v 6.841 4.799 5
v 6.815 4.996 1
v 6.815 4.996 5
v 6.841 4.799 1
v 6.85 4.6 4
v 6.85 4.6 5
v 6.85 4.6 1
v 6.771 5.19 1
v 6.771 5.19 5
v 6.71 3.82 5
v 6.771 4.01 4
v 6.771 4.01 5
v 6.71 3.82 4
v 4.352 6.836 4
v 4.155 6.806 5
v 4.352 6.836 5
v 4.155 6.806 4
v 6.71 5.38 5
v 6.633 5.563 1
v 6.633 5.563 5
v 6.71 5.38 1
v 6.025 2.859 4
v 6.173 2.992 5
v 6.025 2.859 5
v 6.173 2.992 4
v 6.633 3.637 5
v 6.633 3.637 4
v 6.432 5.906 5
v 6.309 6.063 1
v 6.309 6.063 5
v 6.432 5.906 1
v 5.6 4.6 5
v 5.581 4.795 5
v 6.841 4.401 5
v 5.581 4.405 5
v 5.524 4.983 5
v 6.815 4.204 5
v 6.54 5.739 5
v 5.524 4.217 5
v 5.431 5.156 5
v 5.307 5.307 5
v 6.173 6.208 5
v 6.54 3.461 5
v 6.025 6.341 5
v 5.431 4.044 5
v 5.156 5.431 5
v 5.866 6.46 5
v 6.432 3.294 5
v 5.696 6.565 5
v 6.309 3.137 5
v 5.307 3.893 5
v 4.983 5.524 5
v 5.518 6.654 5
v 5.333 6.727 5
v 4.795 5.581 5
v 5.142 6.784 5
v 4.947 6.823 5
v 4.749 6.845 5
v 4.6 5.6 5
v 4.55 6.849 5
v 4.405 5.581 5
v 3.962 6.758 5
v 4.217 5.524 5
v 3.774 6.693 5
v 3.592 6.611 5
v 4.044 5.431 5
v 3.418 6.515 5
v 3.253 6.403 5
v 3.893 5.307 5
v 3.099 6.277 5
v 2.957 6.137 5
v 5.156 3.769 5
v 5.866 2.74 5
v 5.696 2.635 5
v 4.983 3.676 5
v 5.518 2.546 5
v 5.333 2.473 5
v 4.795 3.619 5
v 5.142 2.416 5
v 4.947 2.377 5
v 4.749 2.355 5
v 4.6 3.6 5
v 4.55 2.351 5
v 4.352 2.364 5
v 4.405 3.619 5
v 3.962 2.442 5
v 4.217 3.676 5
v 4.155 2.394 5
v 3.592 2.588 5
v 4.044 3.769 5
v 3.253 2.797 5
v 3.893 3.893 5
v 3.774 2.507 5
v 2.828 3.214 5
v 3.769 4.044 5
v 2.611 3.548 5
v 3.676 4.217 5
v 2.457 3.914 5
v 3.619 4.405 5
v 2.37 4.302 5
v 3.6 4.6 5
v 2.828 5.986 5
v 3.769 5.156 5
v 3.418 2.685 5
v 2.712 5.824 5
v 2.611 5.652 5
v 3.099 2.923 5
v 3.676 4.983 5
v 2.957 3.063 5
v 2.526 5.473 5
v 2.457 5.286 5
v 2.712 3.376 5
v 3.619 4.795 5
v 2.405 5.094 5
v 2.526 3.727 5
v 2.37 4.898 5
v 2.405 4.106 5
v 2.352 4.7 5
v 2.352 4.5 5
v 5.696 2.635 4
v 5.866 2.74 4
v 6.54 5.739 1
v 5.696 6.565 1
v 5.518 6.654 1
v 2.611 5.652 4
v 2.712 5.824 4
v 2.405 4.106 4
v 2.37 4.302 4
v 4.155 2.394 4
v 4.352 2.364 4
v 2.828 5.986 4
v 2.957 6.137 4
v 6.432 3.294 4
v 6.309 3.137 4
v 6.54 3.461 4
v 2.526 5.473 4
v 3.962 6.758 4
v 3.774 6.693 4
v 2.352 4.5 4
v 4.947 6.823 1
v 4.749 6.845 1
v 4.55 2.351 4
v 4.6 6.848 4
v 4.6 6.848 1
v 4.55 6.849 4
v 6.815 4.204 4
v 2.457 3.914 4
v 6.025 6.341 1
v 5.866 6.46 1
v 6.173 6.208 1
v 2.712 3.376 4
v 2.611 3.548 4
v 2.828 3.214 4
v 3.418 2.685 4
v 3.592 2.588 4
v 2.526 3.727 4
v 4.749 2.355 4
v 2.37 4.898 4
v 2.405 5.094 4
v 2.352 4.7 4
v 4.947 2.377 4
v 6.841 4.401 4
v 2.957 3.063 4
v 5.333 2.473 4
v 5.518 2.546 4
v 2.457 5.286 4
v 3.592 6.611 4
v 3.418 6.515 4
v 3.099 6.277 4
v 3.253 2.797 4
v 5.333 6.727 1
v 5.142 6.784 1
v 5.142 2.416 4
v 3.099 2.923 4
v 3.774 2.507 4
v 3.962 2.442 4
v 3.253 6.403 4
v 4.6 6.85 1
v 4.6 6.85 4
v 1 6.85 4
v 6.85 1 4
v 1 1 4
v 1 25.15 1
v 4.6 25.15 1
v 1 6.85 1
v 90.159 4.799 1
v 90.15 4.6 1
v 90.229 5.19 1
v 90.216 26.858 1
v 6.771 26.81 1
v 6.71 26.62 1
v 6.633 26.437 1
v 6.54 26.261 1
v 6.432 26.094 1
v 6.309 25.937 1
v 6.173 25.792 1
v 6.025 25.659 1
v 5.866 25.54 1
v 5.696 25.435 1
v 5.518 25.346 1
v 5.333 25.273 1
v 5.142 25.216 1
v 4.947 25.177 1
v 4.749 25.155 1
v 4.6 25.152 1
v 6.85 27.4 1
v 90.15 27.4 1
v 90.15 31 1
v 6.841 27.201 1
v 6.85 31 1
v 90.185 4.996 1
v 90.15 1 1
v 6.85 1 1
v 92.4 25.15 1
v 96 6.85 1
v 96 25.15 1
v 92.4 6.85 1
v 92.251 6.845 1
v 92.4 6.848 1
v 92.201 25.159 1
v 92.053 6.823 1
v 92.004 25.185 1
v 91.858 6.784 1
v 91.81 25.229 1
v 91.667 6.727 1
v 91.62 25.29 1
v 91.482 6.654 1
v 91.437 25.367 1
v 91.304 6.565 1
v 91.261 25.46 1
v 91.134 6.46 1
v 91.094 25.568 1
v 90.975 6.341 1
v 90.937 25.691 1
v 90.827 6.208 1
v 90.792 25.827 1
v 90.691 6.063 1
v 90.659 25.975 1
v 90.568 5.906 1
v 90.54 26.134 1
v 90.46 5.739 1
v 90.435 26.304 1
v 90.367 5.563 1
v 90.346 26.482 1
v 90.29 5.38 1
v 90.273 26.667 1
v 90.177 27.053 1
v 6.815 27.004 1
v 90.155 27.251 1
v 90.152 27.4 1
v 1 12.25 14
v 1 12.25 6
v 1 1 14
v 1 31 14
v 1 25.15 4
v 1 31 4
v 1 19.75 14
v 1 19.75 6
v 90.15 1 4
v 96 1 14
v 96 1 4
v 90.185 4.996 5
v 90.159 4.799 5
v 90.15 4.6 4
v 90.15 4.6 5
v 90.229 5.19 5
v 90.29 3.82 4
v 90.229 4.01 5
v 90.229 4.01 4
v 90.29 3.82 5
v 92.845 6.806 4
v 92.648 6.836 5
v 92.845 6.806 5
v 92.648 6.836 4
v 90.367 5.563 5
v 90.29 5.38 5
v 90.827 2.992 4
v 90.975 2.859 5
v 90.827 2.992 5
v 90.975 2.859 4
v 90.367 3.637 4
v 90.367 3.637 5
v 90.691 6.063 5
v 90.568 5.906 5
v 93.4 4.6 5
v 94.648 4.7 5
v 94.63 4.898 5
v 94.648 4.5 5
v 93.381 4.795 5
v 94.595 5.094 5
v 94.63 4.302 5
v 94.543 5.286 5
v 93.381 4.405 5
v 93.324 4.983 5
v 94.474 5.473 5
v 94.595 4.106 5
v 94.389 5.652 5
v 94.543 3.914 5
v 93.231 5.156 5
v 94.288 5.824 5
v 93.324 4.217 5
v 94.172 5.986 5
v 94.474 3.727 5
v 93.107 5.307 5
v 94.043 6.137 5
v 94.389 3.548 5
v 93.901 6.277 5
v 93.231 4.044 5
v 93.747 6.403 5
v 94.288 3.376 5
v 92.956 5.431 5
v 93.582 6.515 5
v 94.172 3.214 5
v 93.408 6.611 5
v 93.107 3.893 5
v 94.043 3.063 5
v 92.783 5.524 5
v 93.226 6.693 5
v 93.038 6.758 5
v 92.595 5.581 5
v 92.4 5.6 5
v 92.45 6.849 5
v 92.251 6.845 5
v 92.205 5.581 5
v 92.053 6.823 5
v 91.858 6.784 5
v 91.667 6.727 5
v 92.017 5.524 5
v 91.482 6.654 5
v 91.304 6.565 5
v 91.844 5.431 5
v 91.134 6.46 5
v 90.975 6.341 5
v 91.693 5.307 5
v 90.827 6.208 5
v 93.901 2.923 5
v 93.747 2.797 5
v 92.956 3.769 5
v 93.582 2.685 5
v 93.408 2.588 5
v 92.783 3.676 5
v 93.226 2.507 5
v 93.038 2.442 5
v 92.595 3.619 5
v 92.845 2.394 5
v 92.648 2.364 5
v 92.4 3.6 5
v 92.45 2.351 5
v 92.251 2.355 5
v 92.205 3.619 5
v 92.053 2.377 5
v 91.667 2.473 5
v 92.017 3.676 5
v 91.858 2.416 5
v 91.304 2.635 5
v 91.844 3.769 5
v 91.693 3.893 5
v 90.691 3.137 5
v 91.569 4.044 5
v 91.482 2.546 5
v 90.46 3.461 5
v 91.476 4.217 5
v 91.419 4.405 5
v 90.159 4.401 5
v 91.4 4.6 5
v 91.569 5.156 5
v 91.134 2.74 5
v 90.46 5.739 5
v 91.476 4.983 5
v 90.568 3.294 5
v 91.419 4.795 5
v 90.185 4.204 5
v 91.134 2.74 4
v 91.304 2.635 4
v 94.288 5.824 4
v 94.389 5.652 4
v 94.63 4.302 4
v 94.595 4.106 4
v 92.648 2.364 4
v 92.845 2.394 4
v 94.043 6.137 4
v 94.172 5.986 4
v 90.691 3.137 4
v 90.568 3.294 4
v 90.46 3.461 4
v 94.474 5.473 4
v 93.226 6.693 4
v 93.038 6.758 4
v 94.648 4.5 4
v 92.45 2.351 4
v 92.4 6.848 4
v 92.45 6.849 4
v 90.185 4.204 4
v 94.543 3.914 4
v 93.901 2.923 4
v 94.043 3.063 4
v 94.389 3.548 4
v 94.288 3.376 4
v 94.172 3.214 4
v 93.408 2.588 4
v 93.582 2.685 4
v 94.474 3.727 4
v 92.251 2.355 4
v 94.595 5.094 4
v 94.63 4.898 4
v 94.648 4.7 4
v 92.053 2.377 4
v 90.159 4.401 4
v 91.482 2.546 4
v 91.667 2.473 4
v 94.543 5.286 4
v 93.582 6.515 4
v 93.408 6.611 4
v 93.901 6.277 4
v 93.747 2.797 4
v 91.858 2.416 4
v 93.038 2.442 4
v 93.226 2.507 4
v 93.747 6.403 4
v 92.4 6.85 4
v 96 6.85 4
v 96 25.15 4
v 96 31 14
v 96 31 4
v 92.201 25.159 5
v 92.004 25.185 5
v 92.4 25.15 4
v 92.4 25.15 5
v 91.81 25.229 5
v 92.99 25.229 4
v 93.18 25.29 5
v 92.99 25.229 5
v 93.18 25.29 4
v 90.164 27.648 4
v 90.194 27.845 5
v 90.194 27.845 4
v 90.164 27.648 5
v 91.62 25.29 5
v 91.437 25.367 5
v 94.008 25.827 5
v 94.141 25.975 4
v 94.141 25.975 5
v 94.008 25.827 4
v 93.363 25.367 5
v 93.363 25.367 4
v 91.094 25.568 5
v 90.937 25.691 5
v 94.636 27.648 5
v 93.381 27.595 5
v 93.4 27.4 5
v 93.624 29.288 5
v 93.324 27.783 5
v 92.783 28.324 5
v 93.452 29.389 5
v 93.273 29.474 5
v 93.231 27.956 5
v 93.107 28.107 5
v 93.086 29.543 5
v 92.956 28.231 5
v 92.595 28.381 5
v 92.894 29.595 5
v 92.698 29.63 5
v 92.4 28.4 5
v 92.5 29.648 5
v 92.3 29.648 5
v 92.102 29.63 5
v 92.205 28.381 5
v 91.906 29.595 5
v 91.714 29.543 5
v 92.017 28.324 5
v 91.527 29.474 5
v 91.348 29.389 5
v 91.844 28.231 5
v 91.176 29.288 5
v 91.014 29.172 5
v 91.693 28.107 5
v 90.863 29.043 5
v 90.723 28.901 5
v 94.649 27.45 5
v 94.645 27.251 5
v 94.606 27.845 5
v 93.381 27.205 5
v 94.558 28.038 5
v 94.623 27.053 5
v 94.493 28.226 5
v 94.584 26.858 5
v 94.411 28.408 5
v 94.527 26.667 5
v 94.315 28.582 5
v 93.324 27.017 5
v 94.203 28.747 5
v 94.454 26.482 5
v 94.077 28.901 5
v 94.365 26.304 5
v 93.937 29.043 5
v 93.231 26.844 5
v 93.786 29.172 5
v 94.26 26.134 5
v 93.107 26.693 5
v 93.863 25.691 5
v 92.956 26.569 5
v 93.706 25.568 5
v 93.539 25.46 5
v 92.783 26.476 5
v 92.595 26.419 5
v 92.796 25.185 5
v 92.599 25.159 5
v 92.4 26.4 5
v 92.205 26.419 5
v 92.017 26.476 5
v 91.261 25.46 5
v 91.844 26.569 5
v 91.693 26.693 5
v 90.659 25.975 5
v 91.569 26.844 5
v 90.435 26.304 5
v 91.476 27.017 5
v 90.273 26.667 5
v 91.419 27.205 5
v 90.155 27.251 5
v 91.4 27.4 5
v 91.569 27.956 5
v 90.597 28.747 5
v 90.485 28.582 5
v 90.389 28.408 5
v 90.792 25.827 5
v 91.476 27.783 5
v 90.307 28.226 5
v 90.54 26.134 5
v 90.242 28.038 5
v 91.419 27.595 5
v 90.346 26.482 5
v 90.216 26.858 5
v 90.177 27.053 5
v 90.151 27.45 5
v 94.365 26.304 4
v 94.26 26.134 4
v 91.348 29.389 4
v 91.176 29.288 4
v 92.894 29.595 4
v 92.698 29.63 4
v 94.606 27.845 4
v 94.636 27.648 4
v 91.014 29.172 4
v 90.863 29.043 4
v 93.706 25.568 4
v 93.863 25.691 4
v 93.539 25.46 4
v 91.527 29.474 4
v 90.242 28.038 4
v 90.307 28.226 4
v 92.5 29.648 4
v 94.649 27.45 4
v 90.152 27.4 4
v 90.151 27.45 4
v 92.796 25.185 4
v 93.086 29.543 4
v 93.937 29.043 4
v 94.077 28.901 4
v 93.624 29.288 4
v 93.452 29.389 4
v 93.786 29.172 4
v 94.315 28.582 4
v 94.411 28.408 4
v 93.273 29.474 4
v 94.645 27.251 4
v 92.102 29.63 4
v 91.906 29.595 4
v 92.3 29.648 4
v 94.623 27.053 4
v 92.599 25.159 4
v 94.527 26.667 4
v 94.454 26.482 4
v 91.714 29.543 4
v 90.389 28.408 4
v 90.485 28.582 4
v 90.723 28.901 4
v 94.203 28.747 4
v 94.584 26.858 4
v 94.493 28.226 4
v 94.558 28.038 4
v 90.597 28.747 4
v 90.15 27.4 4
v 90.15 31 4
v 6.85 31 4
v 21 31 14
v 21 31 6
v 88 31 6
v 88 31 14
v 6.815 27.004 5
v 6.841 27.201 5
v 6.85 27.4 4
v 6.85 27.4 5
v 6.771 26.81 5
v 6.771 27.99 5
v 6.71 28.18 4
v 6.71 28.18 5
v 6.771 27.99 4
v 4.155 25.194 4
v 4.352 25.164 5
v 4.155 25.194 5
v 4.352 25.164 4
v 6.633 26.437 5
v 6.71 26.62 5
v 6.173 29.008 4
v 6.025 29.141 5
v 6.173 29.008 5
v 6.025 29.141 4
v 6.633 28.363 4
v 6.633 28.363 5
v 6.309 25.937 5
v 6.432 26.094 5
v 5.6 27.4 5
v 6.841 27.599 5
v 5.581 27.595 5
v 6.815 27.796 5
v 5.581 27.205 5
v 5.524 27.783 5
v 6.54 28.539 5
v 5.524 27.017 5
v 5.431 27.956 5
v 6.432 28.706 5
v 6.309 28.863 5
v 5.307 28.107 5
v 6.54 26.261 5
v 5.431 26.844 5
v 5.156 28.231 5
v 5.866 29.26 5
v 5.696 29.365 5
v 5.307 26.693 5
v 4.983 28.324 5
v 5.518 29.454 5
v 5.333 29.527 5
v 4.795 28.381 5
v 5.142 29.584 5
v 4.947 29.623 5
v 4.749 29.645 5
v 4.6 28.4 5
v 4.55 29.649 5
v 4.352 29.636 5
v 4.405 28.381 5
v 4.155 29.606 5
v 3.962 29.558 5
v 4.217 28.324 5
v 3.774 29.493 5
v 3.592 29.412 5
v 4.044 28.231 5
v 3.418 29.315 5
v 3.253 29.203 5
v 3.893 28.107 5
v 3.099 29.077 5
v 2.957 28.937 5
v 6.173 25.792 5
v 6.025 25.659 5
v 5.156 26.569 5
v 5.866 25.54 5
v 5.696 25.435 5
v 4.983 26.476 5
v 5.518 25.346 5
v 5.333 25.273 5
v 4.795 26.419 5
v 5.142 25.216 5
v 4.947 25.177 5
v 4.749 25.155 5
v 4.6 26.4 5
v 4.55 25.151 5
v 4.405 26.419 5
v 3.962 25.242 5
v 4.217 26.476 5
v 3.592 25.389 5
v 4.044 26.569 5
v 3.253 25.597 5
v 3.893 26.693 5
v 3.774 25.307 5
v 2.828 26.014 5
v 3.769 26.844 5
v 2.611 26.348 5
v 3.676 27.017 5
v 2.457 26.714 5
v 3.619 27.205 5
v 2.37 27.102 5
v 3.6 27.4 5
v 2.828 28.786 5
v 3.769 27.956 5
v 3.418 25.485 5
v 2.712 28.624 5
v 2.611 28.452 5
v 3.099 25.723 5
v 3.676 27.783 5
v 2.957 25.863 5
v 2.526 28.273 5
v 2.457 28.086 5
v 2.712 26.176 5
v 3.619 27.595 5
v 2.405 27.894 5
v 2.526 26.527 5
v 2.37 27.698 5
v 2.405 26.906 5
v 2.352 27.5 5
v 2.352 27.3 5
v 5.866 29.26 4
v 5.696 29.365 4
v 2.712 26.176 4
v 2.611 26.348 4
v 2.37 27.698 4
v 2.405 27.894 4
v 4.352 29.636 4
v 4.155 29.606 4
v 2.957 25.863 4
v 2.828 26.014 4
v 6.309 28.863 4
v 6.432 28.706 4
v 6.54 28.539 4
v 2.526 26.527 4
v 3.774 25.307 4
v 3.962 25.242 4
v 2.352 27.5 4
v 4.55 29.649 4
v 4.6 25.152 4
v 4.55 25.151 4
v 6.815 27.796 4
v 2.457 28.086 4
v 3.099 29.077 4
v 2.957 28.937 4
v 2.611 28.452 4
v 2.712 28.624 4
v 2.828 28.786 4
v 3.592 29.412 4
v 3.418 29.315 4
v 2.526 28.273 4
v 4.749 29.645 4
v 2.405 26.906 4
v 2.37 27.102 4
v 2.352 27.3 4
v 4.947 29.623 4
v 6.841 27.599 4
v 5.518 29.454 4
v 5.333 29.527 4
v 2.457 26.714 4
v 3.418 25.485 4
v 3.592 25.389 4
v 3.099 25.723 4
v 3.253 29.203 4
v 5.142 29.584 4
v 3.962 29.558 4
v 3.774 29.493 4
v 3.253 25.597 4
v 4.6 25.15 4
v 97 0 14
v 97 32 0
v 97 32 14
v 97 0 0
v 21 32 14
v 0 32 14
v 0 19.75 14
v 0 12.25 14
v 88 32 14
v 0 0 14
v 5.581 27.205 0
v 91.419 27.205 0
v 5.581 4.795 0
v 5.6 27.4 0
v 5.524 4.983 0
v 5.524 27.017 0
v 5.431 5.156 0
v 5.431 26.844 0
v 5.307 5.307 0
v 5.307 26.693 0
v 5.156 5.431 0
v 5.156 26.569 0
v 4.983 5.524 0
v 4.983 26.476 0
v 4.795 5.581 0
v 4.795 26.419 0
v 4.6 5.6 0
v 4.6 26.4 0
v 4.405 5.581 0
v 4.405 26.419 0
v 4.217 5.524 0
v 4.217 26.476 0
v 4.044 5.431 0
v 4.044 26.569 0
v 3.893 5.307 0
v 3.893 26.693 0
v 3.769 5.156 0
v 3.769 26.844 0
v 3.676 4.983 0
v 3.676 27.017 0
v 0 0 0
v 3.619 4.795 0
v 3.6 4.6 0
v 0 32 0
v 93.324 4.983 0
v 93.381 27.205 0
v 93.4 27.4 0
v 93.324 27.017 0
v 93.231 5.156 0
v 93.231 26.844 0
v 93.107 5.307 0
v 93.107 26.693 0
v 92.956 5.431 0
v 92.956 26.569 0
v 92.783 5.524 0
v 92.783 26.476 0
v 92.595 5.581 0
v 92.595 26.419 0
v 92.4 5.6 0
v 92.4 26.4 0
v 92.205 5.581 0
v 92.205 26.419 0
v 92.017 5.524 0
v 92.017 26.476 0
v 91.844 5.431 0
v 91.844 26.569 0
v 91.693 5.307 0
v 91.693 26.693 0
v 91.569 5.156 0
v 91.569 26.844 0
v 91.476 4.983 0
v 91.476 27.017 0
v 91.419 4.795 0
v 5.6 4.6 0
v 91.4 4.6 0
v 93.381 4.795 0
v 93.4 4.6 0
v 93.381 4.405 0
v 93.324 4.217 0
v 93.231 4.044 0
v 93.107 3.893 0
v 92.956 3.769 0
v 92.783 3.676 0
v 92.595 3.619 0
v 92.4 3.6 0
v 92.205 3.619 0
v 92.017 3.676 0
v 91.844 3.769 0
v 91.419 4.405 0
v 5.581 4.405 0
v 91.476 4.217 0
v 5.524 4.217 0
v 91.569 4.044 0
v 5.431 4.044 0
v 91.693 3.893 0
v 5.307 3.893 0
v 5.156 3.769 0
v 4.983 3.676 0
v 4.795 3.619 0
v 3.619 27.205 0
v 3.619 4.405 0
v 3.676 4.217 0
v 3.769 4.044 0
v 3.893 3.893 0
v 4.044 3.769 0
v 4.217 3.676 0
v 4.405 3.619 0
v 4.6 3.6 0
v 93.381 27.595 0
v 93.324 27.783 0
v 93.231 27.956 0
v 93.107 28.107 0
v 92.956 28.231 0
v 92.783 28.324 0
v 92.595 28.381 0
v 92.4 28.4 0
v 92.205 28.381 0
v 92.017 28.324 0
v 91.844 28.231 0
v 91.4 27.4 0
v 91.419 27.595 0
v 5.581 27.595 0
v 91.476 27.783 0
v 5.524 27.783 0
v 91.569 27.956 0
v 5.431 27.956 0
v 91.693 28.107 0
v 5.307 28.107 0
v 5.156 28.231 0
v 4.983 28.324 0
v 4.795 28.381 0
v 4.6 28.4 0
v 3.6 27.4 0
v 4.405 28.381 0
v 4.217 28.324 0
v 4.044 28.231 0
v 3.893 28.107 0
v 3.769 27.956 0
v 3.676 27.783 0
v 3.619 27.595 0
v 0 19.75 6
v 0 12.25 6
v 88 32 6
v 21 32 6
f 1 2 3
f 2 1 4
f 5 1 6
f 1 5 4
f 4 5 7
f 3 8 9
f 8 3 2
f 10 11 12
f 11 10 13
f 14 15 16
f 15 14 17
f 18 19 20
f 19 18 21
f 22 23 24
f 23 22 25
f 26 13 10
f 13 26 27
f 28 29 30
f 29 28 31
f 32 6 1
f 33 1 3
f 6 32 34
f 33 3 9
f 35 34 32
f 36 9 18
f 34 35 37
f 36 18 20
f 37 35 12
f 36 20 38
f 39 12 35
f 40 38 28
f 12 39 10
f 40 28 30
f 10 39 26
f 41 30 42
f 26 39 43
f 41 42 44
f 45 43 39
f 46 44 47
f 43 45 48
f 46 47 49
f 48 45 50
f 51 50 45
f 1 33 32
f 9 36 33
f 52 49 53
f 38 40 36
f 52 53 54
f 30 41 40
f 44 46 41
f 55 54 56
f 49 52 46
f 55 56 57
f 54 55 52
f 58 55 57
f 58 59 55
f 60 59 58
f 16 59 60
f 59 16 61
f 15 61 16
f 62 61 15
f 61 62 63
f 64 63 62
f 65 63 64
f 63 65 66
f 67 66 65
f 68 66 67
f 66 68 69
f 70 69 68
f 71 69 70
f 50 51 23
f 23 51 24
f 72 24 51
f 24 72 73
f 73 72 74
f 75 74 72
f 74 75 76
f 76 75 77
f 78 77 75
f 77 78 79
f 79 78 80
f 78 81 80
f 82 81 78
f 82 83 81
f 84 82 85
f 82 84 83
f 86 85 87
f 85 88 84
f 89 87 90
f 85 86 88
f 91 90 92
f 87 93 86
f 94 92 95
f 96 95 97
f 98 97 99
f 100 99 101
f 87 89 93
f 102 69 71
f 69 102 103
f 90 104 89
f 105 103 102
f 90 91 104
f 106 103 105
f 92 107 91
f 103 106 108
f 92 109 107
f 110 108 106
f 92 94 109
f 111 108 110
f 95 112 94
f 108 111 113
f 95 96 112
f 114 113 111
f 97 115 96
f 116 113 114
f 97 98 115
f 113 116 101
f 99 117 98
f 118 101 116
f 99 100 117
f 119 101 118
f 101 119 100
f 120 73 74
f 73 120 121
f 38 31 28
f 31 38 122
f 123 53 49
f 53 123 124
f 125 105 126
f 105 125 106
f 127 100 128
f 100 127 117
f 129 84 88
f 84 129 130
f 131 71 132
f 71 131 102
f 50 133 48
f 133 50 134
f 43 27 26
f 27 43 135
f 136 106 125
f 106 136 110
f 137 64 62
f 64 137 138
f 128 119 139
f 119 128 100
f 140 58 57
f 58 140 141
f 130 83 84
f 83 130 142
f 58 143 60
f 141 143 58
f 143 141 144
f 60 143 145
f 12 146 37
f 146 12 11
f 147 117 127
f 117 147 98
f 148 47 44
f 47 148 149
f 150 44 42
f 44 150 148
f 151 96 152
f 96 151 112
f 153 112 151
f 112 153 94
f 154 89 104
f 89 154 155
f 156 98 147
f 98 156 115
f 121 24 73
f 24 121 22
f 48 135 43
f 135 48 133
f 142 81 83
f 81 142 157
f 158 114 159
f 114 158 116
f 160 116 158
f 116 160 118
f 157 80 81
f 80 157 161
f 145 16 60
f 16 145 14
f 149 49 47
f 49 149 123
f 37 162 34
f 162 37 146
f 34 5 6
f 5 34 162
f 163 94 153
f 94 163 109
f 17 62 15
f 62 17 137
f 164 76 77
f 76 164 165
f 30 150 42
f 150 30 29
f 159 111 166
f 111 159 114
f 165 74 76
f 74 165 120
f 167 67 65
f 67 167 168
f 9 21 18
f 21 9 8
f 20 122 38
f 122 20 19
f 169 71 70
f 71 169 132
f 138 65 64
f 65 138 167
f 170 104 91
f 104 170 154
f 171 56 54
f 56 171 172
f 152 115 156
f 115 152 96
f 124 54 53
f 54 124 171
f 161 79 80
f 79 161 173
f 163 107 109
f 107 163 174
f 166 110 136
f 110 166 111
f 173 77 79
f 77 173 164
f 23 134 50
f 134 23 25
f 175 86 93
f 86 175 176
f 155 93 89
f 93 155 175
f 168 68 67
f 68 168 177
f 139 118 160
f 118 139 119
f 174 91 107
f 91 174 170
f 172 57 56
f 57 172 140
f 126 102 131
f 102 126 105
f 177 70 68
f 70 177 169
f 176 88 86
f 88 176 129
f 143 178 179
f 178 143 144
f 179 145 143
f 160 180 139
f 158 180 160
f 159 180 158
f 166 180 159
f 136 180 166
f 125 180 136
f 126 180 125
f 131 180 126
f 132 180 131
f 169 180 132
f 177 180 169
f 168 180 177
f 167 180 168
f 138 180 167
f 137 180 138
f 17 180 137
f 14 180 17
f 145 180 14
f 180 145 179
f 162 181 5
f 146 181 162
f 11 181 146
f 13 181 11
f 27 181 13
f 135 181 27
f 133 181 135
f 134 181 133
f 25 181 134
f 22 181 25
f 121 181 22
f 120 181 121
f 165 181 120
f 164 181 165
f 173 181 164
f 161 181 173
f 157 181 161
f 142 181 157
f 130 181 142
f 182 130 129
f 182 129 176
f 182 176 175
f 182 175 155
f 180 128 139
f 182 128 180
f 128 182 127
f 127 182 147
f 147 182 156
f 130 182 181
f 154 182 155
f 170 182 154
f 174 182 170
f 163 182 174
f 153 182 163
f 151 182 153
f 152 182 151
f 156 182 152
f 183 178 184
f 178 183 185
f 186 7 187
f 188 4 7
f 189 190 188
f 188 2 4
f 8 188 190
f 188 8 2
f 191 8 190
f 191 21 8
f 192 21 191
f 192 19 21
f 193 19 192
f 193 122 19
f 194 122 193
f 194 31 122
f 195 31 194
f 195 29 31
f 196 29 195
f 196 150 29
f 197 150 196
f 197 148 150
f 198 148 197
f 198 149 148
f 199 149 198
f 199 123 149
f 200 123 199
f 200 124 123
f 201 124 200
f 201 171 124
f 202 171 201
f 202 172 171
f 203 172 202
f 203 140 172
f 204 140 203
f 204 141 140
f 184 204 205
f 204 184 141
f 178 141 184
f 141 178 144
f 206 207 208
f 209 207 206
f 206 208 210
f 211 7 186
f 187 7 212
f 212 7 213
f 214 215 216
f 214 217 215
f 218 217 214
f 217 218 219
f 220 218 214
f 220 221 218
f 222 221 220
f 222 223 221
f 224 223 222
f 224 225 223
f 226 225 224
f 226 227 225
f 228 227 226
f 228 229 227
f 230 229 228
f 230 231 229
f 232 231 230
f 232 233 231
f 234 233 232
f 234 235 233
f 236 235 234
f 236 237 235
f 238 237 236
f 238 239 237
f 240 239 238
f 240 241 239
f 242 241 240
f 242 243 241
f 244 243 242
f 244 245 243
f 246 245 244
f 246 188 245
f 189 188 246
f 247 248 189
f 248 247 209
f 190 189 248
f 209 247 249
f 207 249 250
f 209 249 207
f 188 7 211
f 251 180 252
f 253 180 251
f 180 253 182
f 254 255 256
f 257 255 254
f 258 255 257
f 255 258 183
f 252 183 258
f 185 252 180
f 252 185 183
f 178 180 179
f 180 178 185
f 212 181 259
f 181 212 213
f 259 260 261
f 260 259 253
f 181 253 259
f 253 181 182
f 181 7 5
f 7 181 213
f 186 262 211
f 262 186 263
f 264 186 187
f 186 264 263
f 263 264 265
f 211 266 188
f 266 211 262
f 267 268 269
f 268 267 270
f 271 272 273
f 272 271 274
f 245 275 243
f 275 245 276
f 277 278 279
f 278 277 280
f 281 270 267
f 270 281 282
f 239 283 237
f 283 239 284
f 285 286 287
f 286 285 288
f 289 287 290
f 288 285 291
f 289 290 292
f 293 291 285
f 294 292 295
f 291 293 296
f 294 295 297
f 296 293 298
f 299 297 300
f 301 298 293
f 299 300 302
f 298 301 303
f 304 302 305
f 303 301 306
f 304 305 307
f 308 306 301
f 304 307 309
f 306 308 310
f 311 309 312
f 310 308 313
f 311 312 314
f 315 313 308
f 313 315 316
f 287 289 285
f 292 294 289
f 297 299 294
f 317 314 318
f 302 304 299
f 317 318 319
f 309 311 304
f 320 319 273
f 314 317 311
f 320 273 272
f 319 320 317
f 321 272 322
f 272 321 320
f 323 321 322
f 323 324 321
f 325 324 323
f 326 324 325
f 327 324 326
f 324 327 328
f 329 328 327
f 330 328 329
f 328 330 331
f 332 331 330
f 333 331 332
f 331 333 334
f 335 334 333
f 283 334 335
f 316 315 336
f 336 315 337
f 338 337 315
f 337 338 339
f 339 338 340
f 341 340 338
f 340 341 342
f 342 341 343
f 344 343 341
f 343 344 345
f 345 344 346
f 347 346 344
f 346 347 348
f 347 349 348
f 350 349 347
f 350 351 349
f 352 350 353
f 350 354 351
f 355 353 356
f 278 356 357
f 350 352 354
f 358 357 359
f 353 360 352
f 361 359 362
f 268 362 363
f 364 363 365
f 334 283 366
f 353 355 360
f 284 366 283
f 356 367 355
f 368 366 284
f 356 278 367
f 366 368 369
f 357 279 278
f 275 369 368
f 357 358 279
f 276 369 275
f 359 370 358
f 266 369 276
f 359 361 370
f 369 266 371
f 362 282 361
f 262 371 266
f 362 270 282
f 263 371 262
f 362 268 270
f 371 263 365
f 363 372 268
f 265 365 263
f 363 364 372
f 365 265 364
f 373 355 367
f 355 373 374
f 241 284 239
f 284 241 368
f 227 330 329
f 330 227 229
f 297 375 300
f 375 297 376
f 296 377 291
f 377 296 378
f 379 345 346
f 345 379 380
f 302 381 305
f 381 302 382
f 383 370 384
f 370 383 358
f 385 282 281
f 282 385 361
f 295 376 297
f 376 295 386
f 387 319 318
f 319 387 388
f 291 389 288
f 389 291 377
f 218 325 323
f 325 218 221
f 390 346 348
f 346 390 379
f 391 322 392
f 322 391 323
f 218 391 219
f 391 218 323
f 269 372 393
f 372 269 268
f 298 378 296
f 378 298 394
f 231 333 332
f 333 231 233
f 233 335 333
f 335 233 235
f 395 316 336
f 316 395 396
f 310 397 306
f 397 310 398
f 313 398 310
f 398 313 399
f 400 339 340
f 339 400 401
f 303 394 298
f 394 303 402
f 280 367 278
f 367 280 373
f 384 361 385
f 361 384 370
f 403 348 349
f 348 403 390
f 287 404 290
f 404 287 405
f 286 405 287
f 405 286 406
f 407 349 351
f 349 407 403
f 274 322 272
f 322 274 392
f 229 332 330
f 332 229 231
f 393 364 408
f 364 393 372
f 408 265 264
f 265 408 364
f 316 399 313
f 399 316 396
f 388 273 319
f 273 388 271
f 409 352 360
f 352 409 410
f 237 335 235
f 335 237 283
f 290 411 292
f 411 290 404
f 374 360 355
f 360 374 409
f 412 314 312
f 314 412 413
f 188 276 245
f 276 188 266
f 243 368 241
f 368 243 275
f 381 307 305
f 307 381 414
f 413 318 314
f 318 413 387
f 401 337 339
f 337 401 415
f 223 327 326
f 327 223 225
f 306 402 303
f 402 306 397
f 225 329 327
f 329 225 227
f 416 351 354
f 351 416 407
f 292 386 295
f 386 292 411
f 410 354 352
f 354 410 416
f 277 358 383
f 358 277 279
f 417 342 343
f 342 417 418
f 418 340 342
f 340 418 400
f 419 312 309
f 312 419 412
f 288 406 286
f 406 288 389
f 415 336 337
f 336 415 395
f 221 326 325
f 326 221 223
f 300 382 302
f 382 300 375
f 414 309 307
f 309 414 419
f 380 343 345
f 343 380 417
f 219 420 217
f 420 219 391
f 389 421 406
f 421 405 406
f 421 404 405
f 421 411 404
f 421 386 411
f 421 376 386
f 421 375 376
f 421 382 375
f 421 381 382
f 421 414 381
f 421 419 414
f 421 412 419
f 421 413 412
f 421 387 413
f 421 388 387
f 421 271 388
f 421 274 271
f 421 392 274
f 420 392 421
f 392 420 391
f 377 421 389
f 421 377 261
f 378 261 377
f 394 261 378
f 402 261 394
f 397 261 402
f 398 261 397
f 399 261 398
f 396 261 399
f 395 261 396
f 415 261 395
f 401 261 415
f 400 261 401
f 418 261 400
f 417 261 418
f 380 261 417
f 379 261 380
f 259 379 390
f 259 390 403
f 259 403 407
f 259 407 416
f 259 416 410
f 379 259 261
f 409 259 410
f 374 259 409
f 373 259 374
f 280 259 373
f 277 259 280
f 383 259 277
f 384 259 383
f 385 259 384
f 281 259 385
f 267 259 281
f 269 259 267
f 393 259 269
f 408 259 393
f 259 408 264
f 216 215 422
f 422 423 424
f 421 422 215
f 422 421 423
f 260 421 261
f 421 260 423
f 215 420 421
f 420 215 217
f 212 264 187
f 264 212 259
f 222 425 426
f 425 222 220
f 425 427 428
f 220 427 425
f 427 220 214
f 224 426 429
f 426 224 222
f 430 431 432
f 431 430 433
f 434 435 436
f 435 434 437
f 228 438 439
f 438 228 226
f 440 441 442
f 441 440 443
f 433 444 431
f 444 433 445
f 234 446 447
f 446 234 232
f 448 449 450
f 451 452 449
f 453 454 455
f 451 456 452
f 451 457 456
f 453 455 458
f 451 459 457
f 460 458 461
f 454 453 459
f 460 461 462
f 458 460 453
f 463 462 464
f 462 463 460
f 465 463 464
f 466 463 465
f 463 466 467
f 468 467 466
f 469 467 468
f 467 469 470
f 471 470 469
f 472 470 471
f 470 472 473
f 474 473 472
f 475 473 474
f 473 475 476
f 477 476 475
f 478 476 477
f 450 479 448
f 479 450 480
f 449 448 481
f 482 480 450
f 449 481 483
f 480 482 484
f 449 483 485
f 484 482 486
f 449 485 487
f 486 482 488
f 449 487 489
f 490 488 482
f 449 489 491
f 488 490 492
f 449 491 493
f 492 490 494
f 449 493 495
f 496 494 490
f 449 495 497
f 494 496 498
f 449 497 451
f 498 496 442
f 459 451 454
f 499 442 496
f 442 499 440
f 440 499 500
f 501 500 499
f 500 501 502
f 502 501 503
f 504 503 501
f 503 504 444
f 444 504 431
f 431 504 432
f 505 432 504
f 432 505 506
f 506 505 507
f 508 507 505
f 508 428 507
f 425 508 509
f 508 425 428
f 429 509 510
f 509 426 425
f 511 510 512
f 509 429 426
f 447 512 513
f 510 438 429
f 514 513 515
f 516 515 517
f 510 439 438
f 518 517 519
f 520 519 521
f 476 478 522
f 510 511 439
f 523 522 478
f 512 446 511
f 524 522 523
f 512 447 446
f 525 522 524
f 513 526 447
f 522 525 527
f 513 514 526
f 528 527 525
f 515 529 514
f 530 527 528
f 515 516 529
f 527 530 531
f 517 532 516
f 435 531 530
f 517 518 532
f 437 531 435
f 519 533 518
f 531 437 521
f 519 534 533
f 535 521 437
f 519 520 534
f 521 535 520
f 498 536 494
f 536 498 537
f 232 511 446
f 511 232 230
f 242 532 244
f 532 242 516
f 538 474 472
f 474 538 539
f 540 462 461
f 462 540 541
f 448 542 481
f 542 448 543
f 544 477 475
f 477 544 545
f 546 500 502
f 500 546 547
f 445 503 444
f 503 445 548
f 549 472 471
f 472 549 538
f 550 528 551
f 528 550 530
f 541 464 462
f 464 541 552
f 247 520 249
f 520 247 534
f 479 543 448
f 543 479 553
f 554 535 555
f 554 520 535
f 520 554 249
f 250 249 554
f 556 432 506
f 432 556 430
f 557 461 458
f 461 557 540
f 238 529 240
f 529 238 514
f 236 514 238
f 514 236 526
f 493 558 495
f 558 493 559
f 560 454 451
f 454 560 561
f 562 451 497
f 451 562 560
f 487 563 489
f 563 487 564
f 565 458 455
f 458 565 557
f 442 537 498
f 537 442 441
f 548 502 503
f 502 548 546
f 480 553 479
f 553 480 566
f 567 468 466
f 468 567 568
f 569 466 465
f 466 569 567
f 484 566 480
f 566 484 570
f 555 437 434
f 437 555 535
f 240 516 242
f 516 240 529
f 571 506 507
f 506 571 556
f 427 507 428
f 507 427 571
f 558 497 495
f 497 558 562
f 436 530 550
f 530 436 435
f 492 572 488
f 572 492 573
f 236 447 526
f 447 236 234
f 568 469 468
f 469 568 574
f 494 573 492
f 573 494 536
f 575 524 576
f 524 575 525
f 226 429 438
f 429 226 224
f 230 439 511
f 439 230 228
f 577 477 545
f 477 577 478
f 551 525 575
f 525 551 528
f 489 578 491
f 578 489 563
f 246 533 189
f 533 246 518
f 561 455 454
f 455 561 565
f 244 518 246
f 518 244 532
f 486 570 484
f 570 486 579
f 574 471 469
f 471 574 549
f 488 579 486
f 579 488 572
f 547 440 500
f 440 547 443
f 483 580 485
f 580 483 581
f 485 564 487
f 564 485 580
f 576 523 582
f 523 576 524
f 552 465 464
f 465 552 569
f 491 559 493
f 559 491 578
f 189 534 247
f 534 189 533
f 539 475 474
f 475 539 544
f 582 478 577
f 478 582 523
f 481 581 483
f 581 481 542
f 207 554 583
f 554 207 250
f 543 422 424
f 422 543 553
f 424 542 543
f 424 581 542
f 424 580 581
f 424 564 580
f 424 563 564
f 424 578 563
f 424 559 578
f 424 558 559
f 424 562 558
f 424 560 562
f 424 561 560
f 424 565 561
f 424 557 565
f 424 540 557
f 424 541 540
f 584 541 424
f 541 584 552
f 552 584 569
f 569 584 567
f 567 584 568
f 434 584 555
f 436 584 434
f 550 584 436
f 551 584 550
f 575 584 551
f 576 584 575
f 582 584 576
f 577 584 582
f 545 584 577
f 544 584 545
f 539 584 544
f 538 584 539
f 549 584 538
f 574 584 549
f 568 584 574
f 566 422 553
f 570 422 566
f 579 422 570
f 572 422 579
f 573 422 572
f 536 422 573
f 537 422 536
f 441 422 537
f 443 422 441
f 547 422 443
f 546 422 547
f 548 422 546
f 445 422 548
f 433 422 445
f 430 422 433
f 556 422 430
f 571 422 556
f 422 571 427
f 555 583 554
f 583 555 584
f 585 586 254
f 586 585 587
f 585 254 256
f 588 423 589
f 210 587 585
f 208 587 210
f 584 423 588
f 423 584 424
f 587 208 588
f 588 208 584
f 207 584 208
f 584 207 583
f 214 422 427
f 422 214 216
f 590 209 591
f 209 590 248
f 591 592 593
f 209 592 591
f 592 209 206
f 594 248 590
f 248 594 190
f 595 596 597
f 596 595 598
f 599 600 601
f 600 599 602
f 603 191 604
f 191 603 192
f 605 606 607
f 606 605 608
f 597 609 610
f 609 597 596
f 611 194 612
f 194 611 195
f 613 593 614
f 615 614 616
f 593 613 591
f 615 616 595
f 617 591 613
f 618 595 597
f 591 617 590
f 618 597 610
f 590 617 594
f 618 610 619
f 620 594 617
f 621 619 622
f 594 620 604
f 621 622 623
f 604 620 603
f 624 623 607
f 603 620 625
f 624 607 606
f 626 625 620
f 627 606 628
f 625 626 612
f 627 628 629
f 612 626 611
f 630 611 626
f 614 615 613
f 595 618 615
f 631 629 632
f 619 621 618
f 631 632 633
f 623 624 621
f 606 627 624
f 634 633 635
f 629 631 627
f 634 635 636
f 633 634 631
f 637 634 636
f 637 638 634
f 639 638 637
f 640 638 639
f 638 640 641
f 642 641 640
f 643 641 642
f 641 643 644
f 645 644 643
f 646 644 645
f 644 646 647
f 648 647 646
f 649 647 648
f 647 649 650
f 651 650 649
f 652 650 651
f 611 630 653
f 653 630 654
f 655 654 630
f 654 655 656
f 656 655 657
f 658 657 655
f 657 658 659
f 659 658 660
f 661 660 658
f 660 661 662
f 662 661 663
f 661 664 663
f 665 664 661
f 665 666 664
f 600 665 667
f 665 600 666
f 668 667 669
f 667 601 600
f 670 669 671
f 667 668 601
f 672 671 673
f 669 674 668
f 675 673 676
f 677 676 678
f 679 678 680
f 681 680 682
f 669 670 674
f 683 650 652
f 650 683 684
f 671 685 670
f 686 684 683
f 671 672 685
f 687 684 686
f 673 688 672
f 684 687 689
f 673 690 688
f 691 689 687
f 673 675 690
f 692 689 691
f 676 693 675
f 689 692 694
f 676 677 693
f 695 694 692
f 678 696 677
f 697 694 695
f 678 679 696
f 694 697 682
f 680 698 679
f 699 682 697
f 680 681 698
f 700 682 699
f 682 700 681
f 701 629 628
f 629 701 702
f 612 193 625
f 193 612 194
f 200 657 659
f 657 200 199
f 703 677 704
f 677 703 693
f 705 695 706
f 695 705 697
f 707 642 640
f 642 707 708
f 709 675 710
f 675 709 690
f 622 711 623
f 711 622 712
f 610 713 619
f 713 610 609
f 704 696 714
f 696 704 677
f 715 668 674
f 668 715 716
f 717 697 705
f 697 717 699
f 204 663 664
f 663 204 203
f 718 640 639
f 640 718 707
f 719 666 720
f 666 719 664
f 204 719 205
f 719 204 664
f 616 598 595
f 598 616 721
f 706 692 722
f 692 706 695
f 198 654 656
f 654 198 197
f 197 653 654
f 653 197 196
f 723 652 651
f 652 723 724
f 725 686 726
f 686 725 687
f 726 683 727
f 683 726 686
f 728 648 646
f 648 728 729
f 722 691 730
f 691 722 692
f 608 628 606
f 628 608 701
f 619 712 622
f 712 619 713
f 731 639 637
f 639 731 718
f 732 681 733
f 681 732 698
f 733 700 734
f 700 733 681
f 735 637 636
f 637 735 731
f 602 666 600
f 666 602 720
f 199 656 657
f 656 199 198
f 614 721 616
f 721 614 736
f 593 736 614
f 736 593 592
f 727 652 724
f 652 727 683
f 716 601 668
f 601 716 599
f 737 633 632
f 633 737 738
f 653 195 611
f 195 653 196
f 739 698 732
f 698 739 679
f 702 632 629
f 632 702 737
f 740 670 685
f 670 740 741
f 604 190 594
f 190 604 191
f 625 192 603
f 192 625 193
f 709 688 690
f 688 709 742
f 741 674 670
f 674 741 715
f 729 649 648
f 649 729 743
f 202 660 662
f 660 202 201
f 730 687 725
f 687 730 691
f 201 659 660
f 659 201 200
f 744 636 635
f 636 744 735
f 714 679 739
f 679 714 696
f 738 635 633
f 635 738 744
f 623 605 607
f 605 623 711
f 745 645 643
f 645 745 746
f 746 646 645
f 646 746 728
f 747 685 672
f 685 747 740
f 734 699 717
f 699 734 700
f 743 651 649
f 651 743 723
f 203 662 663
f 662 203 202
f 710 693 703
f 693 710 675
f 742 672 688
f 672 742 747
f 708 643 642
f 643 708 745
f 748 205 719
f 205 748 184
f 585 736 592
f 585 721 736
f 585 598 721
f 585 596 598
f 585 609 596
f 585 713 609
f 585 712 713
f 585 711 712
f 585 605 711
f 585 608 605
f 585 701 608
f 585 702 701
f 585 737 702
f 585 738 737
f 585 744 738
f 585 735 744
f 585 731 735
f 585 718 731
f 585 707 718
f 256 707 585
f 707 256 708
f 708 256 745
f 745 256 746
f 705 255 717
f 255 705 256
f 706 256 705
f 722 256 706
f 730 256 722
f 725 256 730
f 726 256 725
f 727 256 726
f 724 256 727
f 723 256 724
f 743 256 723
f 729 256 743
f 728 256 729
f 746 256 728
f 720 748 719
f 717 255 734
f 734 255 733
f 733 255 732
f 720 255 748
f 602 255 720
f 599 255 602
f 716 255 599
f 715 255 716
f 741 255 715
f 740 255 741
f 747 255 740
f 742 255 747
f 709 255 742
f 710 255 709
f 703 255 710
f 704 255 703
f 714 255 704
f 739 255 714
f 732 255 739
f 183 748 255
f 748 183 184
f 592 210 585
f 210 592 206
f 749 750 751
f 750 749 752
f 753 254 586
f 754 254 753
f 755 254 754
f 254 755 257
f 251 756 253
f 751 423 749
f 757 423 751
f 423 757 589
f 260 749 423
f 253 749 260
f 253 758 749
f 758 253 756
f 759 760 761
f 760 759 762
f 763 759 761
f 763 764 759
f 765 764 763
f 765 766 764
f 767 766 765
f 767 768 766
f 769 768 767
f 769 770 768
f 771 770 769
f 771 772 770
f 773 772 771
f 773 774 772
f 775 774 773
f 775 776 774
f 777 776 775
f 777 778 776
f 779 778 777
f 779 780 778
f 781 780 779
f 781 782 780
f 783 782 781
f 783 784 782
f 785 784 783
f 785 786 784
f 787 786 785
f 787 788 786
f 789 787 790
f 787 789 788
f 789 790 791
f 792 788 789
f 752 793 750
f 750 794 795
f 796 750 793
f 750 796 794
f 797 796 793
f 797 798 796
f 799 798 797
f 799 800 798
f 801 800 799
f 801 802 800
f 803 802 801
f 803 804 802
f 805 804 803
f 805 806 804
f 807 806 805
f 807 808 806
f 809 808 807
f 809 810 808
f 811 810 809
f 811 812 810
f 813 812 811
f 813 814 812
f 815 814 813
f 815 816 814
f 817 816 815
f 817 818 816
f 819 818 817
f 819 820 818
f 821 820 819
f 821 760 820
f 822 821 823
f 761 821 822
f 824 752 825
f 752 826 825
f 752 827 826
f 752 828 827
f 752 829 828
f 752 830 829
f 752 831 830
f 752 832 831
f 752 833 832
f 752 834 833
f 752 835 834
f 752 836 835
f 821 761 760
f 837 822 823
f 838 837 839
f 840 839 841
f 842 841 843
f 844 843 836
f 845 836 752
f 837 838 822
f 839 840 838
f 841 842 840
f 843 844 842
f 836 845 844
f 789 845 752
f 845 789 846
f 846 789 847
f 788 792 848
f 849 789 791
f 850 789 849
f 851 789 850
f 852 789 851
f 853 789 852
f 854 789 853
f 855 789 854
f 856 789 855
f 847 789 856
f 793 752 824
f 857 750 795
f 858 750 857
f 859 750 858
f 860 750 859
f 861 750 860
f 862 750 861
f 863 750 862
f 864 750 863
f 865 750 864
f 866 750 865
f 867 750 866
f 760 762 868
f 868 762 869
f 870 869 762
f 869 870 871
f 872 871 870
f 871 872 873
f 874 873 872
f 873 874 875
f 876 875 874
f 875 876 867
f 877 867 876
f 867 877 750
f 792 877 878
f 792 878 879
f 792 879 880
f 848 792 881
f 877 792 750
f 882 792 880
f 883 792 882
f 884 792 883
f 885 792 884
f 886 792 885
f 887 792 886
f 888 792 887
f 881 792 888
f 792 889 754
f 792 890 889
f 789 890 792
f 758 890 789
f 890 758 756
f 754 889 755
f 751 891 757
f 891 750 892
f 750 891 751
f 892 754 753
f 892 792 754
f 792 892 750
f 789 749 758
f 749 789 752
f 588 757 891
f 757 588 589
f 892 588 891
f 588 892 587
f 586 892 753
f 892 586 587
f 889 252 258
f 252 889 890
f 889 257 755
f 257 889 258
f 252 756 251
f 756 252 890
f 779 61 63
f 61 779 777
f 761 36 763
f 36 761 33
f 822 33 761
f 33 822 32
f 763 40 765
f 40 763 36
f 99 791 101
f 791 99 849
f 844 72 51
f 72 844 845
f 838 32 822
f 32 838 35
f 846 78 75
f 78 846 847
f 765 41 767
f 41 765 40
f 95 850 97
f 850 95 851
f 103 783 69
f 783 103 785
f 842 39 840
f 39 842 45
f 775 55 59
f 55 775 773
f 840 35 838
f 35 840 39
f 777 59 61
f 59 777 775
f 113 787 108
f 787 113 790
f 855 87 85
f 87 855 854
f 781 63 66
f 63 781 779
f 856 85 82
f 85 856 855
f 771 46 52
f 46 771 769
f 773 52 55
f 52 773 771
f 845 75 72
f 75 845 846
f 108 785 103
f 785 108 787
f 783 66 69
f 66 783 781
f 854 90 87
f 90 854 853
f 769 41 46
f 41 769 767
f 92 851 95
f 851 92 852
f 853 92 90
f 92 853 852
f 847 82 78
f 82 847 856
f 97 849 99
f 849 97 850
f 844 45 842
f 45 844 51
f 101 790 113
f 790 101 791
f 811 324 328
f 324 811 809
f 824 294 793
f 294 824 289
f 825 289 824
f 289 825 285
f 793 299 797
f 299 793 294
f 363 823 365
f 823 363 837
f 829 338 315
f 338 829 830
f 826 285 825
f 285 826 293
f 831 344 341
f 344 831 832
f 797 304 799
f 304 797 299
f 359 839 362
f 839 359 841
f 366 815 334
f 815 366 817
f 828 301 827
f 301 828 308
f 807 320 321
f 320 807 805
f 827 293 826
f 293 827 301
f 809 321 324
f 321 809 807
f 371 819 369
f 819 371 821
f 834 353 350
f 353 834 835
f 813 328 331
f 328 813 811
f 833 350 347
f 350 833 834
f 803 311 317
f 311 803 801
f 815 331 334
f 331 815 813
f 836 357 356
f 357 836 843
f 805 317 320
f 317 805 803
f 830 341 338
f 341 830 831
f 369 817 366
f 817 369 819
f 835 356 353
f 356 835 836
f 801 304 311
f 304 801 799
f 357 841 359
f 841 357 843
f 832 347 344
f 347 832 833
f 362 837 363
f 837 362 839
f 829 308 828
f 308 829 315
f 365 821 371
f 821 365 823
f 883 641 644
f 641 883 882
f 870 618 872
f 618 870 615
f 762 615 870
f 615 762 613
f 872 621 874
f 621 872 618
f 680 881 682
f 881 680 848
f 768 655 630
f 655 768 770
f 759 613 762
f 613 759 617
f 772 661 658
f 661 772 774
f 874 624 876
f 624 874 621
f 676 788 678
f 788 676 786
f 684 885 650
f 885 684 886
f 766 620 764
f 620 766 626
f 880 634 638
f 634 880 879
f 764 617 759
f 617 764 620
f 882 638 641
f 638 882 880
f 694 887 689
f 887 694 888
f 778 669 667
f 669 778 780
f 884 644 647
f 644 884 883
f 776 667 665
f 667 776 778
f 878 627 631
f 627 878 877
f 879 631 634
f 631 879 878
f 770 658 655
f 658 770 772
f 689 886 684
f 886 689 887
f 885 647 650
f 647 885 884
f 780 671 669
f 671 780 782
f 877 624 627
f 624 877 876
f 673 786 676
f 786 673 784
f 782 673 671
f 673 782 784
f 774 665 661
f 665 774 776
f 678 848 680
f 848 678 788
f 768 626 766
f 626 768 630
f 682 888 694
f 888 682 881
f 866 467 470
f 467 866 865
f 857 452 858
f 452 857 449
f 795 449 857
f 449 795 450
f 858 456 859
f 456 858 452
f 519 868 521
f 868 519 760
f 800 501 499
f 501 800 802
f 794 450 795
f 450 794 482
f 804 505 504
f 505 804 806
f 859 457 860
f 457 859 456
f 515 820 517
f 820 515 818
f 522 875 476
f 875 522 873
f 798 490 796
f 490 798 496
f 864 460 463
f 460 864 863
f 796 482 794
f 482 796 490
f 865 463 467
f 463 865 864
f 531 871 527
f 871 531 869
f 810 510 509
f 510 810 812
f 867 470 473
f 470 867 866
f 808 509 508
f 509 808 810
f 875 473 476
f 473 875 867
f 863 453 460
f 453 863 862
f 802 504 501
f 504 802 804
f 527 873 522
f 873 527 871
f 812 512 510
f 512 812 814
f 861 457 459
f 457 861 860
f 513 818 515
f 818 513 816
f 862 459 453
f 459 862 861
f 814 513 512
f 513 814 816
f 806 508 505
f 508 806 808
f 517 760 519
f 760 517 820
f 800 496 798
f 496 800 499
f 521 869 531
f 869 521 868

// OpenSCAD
width = 30;
length = 95;
height = 8;
screw_offset = 3.6;
band_width = 67;
band_offset = 20;
serial_width = 7.5;

thickness = 1;
spacing_below = 5;
component_below = 2;
mount_radius = 4.5 / 2;
screw_radius = 2 / 2;
$fs = 0.2;
$fa = 2;

module mount_point() {
	translate([screw_offset, screw_offset, -1]) {
		cylinder(h=spacing_below, r=mount_radius);
	}
	cube([screw_offset, screw_offset + mount_radius, spacing_below - component_below]);
	cube([screw_offset + mount_radius, screw_offset, spacing_below - component_below]);
}

difference() {
	cube([length + thickness * 2, width + thickness * 2, height + spacing_below + thickness]);
	translate([thickness, thickness, thickness]) {
		difference() {
			cube([length, width, height + spacing_below + 1]);

			mount_point();
			translate([length, 0, 0]) {
				mirror([1, 0, 0]) {
					mount_point();
				}
			}
			translate([length, width, 0]) {
				mirror([1, 1, 0]) {
					mount_point();
				}
			}
			translate([0, width, 0]) {
				mirror([0, 1, 0]) {
					mount_point();
				}
			}
		}
	}
	translate([thickness + band_offset, thickness + width - 1, thickness + spacing_below]) {
		cube([band_width, thickness + 2, height + 1]);
	}
	translate([-1, thickness + width / 2 - serial_width / 2, thickness + spacing_below]) {
		cube([thickness + 2, serial_width, height + 1]);
	}

	translate([thickness + screw_offset, thickness + screw_offset, -1]) {
		cylinder(h=thickness + spacing_below + 2, r=screw_radius);
	}
	translate([thickness + length - screw_offset, thickness + screw_offset, -1]) {
		cylinder(h=thickness + spacing_below + 2, r=screw_radius);
	}
	translate([thickness + screw_offset, thickness + width - screw_offset, -1]) {
		cylinder(h=thickness + spacing_below + 2, r=screw_radius);
	}
	translate([thickness + length - screw_offset, thickness + width - screw_offset, -1]) {
		cylinder(h=thickness + spacing_below + 2, r=screw_radius);
	}
}
